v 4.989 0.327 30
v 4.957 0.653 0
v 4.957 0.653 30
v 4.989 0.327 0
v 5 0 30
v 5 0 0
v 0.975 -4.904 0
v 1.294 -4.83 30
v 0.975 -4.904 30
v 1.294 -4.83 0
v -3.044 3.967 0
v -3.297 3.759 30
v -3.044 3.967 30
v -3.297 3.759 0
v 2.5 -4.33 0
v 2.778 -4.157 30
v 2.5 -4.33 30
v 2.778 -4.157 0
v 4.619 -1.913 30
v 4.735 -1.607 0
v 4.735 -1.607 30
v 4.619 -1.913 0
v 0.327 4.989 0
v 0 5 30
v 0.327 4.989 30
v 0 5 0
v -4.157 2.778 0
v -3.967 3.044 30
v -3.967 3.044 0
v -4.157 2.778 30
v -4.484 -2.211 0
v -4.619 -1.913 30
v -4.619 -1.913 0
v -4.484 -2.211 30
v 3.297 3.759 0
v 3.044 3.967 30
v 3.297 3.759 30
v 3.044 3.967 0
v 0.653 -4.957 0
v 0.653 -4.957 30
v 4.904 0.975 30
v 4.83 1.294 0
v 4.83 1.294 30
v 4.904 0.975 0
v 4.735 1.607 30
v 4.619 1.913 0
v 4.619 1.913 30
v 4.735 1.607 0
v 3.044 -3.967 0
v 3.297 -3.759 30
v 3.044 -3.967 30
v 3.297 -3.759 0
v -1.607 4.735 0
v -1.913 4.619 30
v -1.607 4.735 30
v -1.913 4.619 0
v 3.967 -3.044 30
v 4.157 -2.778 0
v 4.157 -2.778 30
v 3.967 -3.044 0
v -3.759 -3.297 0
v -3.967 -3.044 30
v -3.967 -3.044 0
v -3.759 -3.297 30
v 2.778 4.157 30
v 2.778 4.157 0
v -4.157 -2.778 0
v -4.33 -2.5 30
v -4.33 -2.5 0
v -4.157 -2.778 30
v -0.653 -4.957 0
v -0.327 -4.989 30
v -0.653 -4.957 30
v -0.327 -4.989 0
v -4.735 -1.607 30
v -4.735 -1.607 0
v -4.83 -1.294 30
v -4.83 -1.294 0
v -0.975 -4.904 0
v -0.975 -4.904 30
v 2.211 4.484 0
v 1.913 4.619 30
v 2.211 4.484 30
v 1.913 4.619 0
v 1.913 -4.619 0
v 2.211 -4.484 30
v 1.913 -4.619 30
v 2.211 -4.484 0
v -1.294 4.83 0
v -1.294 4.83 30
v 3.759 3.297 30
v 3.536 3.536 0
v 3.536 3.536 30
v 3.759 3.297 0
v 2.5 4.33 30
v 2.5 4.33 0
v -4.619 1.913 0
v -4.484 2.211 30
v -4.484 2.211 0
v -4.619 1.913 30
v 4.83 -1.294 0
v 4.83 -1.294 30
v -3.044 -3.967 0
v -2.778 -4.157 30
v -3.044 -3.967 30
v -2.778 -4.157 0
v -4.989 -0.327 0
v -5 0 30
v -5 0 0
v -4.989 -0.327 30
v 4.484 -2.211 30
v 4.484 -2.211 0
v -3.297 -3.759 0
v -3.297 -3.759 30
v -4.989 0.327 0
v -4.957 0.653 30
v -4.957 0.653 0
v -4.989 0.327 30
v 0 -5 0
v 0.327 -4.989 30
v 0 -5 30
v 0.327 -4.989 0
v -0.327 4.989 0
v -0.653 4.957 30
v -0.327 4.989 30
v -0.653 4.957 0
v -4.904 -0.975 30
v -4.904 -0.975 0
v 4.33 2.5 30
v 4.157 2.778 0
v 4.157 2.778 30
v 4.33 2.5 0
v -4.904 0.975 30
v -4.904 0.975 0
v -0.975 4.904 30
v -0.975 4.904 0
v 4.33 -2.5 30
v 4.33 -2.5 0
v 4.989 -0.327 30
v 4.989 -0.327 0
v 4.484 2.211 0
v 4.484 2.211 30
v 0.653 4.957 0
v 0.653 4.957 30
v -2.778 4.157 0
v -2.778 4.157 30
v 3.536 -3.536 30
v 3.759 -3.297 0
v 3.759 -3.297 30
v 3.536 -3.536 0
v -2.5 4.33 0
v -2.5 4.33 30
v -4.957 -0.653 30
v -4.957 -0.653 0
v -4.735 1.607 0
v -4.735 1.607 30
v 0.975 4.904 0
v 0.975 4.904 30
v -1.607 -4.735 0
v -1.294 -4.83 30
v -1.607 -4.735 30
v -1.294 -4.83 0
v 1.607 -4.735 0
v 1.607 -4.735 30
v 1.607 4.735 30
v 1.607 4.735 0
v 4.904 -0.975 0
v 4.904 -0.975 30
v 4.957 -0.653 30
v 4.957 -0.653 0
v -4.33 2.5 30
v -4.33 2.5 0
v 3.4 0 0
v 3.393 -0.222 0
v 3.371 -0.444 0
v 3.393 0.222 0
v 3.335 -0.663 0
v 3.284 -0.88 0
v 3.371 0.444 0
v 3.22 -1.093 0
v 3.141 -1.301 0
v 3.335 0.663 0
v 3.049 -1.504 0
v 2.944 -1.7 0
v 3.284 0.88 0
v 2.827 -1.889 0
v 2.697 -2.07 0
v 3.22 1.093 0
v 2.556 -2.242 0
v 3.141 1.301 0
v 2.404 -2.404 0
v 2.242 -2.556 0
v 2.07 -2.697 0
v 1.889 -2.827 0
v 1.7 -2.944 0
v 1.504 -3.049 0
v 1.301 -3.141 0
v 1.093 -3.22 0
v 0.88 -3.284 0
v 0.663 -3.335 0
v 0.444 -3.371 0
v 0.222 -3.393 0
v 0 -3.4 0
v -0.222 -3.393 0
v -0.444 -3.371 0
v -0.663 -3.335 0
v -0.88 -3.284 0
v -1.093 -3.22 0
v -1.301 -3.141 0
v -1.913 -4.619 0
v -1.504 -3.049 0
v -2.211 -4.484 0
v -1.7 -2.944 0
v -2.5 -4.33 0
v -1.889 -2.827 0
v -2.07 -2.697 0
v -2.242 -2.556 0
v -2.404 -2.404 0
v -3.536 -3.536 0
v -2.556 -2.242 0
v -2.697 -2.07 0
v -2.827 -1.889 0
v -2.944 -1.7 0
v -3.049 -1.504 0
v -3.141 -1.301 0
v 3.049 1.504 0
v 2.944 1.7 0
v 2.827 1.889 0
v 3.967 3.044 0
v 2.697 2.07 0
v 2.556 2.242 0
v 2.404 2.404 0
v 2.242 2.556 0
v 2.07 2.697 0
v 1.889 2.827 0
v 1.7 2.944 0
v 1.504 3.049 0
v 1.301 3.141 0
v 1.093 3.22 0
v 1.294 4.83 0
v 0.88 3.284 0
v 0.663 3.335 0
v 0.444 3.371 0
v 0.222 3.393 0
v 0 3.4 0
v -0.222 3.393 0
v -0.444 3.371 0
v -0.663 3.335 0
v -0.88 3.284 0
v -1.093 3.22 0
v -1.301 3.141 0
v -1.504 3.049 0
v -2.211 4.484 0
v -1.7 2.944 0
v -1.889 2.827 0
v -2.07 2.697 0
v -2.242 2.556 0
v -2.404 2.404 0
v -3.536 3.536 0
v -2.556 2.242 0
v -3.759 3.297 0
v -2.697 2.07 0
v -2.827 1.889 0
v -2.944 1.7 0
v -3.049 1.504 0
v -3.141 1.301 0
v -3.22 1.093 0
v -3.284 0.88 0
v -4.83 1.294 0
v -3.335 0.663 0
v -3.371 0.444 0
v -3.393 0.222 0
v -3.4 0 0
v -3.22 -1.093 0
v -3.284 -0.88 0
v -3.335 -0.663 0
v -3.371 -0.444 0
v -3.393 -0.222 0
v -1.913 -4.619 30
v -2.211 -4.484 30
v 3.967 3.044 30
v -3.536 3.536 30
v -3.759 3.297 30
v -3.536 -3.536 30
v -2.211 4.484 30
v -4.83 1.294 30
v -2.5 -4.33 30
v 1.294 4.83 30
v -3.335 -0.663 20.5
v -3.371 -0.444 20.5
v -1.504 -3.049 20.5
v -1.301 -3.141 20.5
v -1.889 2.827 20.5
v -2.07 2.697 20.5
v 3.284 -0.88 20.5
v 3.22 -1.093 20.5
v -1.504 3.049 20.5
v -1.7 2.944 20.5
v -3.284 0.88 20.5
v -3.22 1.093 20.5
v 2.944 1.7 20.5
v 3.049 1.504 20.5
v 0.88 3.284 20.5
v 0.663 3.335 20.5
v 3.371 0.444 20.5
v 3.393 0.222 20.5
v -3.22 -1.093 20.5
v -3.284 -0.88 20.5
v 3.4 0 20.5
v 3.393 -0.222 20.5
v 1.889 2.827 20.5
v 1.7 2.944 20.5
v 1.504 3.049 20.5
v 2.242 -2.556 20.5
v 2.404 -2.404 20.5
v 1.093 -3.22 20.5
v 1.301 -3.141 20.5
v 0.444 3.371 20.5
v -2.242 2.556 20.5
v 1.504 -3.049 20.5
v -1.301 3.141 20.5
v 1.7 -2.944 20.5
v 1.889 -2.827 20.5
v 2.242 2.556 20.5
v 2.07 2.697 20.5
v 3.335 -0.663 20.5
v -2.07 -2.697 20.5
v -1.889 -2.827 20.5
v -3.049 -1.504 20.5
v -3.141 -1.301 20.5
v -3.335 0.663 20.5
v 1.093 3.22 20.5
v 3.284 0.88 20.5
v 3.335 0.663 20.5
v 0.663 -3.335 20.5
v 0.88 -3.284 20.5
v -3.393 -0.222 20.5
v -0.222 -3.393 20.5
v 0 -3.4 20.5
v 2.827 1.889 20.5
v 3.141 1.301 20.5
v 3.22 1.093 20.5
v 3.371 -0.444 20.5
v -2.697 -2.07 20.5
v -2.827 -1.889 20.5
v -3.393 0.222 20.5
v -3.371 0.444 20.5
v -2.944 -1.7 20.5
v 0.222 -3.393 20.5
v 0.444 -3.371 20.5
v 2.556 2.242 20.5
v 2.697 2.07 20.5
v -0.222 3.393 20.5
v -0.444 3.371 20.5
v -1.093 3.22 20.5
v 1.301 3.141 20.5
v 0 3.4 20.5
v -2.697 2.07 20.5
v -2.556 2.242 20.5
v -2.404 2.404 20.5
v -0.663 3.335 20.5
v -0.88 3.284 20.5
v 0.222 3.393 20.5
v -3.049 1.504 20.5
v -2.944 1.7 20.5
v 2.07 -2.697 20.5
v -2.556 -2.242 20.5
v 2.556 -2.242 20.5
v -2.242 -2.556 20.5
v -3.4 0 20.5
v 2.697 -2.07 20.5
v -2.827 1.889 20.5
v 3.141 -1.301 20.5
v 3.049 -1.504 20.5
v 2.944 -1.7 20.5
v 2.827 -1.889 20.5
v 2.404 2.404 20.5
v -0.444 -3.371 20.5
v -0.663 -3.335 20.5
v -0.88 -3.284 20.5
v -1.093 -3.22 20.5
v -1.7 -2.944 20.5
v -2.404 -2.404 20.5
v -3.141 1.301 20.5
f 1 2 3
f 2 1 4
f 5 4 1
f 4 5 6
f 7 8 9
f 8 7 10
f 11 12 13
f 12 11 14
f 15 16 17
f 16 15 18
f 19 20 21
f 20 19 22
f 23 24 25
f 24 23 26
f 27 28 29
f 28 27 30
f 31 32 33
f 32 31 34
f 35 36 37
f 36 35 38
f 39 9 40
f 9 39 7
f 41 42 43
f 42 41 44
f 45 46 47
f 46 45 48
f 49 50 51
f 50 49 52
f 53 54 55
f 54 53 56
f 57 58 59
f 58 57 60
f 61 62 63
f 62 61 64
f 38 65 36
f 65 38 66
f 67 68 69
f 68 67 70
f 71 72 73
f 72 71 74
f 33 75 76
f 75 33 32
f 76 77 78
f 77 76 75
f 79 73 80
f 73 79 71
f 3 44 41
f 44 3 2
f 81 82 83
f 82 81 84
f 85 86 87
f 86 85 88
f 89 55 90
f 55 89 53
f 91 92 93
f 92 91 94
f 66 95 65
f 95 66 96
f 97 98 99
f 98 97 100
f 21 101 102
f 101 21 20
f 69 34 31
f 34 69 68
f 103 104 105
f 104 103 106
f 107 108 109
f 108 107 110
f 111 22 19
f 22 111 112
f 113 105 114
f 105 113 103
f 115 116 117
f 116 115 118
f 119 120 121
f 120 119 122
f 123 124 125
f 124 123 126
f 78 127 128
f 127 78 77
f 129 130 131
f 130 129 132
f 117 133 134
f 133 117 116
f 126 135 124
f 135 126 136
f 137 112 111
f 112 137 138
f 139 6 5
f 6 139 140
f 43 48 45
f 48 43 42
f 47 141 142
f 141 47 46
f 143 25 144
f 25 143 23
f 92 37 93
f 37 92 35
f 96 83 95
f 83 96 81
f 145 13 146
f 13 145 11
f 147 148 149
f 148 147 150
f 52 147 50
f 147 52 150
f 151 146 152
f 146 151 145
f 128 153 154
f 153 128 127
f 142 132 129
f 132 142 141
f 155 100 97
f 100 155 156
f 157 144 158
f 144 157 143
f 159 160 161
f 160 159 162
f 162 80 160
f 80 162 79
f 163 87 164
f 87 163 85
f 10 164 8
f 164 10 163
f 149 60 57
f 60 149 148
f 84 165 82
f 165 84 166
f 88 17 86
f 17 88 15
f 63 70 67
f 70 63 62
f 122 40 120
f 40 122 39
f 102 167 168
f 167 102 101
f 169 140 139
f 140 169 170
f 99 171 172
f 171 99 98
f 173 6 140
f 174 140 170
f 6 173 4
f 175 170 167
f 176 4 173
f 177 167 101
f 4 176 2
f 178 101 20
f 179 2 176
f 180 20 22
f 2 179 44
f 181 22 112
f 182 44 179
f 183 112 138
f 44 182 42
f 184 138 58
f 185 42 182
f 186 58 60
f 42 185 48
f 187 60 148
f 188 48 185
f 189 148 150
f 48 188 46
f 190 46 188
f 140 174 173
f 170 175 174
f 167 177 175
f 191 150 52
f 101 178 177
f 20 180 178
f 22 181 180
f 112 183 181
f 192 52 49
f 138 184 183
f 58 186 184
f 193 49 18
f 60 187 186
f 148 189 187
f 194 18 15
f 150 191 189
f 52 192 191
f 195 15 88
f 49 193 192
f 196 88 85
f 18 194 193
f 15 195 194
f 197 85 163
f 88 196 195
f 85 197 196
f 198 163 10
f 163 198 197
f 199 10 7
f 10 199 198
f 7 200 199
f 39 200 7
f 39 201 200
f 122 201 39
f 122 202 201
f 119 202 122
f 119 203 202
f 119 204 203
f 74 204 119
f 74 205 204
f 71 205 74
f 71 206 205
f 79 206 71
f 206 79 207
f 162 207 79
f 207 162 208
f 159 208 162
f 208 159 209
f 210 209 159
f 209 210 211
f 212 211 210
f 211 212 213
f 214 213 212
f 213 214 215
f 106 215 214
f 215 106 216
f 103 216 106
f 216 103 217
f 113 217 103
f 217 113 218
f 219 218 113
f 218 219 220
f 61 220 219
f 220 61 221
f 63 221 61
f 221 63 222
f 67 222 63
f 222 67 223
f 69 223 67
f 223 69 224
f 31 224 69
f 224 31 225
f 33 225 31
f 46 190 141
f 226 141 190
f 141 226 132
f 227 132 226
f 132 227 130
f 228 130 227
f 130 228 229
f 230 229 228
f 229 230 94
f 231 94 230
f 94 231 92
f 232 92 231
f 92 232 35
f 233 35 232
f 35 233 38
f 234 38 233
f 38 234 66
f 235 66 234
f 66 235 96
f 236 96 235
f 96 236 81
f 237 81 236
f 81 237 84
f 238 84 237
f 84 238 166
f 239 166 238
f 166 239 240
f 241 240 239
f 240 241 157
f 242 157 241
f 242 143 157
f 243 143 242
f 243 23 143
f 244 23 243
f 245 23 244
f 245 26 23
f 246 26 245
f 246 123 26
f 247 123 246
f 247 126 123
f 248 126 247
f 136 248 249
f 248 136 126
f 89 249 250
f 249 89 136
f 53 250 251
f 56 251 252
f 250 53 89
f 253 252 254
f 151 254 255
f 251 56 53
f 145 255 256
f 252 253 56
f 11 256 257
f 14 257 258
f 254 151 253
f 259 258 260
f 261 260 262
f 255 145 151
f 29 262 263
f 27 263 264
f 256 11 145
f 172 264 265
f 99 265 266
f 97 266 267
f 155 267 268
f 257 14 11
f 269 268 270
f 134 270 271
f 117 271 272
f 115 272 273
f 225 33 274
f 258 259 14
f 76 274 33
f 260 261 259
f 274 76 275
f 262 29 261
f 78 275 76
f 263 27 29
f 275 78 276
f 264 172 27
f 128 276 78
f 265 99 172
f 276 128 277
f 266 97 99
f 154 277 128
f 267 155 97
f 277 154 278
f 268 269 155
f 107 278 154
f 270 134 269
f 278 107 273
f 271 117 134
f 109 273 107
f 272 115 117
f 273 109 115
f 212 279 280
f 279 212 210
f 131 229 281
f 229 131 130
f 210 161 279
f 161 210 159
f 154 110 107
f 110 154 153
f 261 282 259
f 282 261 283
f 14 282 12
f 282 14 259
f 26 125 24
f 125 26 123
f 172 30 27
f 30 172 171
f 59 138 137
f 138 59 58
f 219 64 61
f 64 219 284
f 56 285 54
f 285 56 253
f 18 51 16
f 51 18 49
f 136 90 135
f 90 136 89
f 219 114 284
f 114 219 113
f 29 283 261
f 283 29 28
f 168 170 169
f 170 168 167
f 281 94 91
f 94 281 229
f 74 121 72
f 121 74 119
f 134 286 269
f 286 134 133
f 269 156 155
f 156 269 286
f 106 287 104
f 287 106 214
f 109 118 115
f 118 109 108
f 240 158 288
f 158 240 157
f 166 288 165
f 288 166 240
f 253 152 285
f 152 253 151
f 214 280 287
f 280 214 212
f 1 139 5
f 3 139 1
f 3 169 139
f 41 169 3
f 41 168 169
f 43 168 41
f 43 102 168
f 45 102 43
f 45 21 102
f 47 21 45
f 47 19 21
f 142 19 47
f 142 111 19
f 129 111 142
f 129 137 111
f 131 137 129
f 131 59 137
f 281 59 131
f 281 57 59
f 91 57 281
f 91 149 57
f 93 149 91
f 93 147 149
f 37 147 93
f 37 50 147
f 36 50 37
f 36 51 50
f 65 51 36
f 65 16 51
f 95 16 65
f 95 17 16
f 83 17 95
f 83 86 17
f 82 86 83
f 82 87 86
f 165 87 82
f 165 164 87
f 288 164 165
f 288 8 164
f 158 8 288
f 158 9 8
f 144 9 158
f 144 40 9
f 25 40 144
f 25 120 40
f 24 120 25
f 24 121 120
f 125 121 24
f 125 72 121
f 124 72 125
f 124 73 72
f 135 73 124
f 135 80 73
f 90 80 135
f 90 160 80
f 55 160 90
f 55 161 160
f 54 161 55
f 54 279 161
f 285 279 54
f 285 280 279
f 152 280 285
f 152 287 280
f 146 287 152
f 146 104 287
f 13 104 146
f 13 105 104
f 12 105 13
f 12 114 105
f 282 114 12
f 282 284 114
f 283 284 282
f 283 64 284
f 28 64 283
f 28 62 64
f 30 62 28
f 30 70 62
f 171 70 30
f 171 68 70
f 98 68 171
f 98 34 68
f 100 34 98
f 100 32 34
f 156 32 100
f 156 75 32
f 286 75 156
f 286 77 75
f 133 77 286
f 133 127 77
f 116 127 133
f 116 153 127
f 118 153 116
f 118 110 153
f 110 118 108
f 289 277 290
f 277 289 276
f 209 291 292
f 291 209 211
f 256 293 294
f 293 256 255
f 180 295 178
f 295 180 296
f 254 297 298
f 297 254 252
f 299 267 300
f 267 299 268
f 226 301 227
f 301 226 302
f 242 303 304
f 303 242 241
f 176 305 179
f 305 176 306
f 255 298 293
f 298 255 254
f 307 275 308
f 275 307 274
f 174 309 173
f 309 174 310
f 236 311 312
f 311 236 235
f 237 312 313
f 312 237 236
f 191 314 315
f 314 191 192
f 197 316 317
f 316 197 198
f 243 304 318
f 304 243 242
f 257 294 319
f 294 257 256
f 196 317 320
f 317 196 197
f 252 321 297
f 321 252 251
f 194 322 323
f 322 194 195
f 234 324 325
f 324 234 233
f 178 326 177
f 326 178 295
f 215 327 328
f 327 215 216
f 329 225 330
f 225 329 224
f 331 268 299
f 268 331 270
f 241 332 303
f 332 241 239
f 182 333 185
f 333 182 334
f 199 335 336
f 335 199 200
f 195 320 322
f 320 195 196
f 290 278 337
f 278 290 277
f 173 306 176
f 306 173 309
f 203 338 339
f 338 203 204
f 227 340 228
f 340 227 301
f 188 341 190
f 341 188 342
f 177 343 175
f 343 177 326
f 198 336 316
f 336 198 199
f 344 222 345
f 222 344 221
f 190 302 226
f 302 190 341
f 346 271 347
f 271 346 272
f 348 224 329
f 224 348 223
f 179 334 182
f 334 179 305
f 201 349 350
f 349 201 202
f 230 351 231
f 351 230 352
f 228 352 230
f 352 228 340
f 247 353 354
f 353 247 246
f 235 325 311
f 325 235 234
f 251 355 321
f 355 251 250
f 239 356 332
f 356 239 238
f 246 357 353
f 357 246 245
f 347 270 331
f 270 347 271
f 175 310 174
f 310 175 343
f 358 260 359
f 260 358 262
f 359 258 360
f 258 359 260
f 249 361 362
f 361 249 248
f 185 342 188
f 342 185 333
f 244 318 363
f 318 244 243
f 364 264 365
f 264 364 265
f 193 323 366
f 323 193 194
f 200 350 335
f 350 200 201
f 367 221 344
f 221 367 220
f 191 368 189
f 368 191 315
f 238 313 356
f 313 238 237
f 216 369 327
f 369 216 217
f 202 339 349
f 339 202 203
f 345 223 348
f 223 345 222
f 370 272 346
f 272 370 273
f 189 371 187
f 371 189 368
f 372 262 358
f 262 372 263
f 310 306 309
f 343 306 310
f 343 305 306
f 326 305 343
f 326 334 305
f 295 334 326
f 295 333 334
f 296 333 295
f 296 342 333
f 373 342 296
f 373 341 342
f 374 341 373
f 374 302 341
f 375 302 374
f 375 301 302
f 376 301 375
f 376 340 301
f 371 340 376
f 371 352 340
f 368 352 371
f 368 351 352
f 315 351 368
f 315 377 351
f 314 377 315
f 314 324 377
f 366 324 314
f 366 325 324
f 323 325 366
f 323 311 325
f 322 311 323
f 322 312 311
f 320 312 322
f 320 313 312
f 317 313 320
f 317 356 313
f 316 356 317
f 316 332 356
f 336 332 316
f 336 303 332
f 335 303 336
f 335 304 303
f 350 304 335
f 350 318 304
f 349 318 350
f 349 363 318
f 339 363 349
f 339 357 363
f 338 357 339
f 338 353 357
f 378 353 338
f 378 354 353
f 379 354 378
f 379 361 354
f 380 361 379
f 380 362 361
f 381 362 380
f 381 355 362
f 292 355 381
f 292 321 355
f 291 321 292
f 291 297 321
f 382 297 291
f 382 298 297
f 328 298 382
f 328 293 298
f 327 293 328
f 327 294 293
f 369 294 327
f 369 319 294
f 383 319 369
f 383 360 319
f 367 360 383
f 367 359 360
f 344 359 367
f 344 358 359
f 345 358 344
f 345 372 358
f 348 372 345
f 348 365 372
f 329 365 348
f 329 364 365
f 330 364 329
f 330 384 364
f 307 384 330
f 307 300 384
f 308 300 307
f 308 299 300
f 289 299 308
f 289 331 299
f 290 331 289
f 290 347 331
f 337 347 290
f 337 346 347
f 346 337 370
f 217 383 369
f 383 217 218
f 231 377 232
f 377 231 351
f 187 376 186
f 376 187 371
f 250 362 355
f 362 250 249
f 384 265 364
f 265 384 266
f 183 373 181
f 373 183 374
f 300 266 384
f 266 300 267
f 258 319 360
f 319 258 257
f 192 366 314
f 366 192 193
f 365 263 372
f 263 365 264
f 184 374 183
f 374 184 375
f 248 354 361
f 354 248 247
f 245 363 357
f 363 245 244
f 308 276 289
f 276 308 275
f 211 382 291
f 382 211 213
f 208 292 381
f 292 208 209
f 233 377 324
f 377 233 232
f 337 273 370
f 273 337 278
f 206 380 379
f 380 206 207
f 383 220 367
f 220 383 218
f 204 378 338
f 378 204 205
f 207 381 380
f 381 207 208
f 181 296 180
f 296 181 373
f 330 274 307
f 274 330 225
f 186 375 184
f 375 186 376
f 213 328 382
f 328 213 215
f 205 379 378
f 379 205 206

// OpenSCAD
// Lab funnel - printed upright, wide opening at the top, open at both ends
// Units: mm. Straight spout (tube) from z = 0 to z = 20, then a cone
// widens to a 60 mm rim at z = 50. Wall thickness 1.6 mm everywhere.

// ---------------- Parameters ----------------
spout_d        = 10;    // spout outer diameter
spout_bore     = spout_d - 2 * 1.6;  // spout bore (6.8 mm)
spout_h        = 20;    // spout height (z = 0 to z = 20)
cone_top_d     = 10;    // cone top diameter, same as spout outer diameter
cone_bottom_d  = 60;    // cone rim diameter at the top (z = 50)
cone_h         = 50 - 20;  // cone height (z = 20 to z = 50)
wall           = 1.6;   // wall thickness, spout and cone
eps            = 0.5;   // cutter overshoot past faces

$fn = 96;               // smoothness for curved surfaces

// ---------------- Model ----------------
difference() {
    union() {
        // Spout: cylinder, z = 0 to z = 20
        cylinder(d = spout_d, h = spout_h);

        // Cone: 10 mm outer diameter at z = 20, 60 mm outer diameter at z = 50
        // (centre-to-centre height = cone_h = 30 mm)
        linear_extrude(height = cone_h)
            circle(d = cone_top_d, h = cone_h + 0.001);  // tiny overlap into spout
    }

    // Bore through the spout (constant 6.8 mm)
    translate([0, 0, -eps])
        cylinder(d = spout_bore, h = spout_h + 2 * eps);

    // Open top rim: cut the upper wall so the cone is open at z = 50
    translate([0, 0, spout_h + cone_h - wall - eps])
        cylinder(d = cone_bottom_d + 2 * eps, h = wall + 2 * eps);
}
